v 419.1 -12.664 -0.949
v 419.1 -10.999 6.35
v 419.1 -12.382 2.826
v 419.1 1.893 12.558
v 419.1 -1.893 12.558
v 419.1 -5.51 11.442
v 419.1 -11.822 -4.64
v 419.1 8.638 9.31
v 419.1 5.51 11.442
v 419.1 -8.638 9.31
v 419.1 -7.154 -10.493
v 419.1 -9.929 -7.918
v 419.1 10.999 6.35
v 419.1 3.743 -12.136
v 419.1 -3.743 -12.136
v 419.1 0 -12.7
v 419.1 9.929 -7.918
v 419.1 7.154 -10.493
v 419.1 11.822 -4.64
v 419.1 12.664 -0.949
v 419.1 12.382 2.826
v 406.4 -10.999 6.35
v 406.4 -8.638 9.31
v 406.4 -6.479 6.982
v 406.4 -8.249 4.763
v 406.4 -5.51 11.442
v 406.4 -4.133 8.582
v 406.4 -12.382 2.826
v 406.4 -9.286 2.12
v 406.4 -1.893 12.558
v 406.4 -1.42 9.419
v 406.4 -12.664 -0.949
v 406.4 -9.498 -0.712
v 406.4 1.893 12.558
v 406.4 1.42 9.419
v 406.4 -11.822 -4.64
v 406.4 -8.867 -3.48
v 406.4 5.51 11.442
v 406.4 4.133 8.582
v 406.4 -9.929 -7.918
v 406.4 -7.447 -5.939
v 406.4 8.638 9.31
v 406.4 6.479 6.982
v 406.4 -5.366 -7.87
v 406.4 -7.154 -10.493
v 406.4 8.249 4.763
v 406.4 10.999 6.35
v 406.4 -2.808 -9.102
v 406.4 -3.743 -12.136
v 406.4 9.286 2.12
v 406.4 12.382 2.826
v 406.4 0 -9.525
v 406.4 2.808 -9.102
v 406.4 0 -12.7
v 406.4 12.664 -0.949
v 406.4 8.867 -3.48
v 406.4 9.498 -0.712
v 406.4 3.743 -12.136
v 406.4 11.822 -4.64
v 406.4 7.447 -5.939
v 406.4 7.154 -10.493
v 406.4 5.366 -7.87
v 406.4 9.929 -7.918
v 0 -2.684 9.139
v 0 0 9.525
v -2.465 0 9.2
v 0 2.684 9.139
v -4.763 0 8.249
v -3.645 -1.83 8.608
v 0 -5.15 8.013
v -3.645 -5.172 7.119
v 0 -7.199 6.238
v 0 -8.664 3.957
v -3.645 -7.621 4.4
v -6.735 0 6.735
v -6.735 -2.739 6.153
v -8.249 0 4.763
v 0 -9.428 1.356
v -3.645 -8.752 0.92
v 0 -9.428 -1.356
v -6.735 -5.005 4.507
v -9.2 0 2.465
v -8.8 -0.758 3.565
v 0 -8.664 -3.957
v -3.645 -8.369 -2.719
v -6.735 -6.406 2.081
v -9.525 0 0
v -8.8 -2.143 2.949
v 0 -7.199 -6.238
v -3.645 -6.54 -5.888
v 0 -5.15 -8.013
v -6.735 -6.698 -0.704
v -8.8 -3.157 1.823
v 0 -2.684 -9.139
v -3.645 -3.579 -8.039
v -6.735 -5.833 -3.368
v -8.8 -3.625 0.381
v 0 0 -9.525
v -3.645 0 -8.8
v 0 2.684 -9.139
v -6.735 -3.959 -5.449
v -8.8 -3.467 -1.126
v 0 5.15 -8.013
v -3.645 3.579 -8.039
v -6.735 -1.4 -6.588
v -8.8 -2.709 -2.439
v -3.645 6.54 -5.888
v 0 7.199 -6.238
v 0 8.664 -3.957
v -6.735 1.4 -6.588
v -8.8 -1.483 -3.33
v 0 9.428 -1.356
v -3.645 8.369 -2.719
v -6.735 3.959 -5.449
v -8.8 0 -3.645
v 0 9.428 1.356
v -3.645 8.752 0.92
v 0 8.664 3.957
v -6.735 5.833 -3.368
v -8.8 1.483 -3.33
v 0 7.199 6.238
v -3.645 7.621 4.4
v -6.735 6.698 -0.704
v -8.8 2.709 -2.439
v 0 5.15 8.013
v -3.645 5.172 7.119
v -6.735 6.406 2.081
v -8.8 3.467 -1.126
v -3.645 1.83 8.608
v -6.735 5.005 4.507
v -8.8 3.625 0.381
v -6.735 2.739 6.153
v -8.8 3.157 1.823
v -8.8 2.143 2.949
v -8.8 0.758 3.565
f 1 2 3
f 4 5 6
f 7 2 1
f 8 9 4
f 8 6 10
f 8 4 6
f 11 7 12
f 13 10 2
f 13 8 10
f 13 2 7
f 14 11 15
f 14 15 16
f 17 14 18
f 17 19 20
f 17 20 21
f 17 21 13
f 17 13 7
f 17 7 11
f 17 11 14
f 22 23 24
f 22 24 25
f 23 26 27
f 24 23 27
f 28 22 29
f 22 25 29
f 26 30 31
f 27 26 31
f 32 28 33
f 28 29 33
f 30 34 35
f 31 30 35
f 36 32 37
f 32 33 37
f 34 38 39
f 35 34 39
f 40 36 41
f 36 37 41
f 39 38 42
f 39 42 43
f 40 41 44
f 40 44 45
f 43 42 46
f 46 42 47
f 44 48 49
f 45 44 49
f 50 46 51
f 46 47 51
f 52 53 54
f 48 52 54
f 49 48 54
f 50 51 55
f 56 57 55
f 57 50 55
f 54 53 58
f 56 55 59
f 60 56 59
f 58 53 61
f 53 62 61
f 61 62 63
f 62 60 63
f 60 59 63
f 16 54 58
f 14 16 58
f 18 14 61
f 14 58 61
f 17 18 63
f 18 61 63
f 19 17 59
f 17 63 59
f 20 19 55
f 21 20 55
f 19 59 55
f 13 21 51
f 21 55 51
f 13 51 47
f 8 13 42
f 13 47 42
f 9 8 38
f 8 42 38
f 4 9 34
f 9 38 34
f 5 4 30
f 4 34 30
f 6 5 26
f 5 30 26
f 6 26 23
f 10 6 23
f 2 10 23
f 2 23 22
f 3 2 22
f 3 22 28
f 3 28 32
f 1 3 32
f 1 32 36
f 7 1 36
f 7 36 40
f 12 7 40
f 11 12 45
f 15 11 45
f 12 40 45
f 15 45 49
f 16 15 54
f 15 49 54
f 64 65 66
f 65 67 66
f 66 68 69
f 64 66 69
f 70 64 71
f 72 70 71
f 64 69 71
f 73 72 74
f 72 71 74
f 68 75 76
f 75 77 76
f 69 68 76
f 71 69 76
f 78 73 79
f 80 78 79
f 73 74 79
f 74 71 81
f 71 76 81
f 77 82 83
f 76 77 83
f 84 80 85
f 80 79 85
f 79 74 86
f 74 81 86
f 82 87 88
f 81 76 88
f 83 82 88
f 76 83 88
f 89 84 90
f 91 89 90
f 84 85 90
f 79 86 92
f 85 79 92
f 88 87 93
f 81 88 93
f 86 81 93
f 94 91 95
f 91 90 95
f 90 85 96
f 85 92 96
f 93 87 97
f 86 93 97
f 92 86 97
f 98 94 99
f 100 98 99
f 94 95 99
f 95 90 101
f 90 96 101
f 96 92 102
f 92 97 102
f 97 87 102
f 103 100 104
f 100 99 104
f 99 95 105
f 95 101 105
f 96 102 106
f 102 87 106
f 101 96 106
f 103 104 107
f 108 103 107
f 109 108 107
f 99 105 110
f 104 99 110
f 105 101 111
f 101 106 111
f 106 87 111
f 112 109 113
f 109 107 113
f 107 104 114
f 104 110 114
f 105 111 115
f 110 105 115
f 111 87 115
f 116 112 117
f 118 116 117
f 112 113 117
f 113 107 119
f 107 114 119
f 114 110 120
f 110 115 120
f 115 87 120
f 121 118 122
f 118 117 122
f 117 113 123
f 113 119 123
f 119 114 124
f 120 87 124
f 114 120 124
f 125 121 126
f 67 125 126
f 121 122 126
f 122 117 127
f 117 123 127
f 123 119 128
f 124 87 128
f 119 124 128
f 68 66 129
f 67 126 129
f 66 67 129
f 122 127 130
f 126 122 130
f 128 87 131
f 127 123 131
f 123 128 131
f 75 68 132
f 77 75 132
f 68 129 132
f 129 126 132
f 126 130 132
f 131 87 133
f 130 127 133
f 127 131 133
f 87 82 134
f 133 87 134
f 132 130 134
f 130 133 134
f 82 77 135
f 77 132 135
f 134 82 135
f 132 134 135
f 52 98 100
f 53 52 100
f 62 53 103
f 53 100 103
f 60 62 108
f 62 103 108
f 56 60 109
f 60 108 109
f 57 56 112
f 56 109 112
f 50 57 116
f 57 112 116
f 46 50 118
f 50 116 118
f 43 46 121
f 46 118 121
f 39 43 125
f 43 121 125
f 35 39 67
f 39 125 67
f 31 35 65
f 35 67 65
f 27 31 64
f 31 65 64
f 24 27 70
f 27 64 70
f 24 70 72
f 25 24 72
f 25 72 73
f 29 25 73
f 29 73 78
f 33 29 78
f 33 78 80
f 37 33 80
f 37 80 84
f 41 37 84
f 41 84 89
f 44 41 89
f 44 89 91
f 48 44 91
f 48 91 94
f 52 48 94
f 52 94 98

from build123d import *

# Parameters (mm, degrees)
SKETCH1_R           = 9.525
BOSS_EXTRUDE1_DEPTH = 406.4
SKETCH3_R           = 12.7
BOSS_EXTRUDE2_DEPTH = 12.7


with BuildPart() as part:
    # Sketch1 → Boss-Extrude1 (new body)
    with BuildSketch(Plane(origin=(0, 0, 0), x_dir=(0, 0, -1), z_dir=(1, 0, 0))):
        Circle(SKETCH1_R)
    extrude(amount=BOSS_EXTRUDE1_DEPTH)

    # Sketch2 → Revolve1 (revolve)
    with BuildSketch(Plane.XY, mode=Mode.PRIVATE) as revolve1_sk:
        with BuildLine():
            Line((-9.525, 0), (0, 0))
            Line((0, 0), (0, 9.525))
            ThreePointArc((0, 9.525), (-6.735192091, 6.735192091), (-9.525, 0))
        make_face()
    revolve(revolve1_sk.sketch.rotate(Axis((-9.525, 0, 0), (1, 0, 0)), 90), axis=Axis((-9.525, 0, 0), (1, 0, 0)))

    # Sketch3 → Boss-Extrude2 (add)
    with BuildSketch(Plane(origin=(406.4, 0, 0), x_dir=(0, 0, -1), z_dir=(1, 0, 0))):
        Circle(SKETCH3_R)
    extrude(amount=BOSS_EXTRUDE2_DEPTH)


solid = part.part
